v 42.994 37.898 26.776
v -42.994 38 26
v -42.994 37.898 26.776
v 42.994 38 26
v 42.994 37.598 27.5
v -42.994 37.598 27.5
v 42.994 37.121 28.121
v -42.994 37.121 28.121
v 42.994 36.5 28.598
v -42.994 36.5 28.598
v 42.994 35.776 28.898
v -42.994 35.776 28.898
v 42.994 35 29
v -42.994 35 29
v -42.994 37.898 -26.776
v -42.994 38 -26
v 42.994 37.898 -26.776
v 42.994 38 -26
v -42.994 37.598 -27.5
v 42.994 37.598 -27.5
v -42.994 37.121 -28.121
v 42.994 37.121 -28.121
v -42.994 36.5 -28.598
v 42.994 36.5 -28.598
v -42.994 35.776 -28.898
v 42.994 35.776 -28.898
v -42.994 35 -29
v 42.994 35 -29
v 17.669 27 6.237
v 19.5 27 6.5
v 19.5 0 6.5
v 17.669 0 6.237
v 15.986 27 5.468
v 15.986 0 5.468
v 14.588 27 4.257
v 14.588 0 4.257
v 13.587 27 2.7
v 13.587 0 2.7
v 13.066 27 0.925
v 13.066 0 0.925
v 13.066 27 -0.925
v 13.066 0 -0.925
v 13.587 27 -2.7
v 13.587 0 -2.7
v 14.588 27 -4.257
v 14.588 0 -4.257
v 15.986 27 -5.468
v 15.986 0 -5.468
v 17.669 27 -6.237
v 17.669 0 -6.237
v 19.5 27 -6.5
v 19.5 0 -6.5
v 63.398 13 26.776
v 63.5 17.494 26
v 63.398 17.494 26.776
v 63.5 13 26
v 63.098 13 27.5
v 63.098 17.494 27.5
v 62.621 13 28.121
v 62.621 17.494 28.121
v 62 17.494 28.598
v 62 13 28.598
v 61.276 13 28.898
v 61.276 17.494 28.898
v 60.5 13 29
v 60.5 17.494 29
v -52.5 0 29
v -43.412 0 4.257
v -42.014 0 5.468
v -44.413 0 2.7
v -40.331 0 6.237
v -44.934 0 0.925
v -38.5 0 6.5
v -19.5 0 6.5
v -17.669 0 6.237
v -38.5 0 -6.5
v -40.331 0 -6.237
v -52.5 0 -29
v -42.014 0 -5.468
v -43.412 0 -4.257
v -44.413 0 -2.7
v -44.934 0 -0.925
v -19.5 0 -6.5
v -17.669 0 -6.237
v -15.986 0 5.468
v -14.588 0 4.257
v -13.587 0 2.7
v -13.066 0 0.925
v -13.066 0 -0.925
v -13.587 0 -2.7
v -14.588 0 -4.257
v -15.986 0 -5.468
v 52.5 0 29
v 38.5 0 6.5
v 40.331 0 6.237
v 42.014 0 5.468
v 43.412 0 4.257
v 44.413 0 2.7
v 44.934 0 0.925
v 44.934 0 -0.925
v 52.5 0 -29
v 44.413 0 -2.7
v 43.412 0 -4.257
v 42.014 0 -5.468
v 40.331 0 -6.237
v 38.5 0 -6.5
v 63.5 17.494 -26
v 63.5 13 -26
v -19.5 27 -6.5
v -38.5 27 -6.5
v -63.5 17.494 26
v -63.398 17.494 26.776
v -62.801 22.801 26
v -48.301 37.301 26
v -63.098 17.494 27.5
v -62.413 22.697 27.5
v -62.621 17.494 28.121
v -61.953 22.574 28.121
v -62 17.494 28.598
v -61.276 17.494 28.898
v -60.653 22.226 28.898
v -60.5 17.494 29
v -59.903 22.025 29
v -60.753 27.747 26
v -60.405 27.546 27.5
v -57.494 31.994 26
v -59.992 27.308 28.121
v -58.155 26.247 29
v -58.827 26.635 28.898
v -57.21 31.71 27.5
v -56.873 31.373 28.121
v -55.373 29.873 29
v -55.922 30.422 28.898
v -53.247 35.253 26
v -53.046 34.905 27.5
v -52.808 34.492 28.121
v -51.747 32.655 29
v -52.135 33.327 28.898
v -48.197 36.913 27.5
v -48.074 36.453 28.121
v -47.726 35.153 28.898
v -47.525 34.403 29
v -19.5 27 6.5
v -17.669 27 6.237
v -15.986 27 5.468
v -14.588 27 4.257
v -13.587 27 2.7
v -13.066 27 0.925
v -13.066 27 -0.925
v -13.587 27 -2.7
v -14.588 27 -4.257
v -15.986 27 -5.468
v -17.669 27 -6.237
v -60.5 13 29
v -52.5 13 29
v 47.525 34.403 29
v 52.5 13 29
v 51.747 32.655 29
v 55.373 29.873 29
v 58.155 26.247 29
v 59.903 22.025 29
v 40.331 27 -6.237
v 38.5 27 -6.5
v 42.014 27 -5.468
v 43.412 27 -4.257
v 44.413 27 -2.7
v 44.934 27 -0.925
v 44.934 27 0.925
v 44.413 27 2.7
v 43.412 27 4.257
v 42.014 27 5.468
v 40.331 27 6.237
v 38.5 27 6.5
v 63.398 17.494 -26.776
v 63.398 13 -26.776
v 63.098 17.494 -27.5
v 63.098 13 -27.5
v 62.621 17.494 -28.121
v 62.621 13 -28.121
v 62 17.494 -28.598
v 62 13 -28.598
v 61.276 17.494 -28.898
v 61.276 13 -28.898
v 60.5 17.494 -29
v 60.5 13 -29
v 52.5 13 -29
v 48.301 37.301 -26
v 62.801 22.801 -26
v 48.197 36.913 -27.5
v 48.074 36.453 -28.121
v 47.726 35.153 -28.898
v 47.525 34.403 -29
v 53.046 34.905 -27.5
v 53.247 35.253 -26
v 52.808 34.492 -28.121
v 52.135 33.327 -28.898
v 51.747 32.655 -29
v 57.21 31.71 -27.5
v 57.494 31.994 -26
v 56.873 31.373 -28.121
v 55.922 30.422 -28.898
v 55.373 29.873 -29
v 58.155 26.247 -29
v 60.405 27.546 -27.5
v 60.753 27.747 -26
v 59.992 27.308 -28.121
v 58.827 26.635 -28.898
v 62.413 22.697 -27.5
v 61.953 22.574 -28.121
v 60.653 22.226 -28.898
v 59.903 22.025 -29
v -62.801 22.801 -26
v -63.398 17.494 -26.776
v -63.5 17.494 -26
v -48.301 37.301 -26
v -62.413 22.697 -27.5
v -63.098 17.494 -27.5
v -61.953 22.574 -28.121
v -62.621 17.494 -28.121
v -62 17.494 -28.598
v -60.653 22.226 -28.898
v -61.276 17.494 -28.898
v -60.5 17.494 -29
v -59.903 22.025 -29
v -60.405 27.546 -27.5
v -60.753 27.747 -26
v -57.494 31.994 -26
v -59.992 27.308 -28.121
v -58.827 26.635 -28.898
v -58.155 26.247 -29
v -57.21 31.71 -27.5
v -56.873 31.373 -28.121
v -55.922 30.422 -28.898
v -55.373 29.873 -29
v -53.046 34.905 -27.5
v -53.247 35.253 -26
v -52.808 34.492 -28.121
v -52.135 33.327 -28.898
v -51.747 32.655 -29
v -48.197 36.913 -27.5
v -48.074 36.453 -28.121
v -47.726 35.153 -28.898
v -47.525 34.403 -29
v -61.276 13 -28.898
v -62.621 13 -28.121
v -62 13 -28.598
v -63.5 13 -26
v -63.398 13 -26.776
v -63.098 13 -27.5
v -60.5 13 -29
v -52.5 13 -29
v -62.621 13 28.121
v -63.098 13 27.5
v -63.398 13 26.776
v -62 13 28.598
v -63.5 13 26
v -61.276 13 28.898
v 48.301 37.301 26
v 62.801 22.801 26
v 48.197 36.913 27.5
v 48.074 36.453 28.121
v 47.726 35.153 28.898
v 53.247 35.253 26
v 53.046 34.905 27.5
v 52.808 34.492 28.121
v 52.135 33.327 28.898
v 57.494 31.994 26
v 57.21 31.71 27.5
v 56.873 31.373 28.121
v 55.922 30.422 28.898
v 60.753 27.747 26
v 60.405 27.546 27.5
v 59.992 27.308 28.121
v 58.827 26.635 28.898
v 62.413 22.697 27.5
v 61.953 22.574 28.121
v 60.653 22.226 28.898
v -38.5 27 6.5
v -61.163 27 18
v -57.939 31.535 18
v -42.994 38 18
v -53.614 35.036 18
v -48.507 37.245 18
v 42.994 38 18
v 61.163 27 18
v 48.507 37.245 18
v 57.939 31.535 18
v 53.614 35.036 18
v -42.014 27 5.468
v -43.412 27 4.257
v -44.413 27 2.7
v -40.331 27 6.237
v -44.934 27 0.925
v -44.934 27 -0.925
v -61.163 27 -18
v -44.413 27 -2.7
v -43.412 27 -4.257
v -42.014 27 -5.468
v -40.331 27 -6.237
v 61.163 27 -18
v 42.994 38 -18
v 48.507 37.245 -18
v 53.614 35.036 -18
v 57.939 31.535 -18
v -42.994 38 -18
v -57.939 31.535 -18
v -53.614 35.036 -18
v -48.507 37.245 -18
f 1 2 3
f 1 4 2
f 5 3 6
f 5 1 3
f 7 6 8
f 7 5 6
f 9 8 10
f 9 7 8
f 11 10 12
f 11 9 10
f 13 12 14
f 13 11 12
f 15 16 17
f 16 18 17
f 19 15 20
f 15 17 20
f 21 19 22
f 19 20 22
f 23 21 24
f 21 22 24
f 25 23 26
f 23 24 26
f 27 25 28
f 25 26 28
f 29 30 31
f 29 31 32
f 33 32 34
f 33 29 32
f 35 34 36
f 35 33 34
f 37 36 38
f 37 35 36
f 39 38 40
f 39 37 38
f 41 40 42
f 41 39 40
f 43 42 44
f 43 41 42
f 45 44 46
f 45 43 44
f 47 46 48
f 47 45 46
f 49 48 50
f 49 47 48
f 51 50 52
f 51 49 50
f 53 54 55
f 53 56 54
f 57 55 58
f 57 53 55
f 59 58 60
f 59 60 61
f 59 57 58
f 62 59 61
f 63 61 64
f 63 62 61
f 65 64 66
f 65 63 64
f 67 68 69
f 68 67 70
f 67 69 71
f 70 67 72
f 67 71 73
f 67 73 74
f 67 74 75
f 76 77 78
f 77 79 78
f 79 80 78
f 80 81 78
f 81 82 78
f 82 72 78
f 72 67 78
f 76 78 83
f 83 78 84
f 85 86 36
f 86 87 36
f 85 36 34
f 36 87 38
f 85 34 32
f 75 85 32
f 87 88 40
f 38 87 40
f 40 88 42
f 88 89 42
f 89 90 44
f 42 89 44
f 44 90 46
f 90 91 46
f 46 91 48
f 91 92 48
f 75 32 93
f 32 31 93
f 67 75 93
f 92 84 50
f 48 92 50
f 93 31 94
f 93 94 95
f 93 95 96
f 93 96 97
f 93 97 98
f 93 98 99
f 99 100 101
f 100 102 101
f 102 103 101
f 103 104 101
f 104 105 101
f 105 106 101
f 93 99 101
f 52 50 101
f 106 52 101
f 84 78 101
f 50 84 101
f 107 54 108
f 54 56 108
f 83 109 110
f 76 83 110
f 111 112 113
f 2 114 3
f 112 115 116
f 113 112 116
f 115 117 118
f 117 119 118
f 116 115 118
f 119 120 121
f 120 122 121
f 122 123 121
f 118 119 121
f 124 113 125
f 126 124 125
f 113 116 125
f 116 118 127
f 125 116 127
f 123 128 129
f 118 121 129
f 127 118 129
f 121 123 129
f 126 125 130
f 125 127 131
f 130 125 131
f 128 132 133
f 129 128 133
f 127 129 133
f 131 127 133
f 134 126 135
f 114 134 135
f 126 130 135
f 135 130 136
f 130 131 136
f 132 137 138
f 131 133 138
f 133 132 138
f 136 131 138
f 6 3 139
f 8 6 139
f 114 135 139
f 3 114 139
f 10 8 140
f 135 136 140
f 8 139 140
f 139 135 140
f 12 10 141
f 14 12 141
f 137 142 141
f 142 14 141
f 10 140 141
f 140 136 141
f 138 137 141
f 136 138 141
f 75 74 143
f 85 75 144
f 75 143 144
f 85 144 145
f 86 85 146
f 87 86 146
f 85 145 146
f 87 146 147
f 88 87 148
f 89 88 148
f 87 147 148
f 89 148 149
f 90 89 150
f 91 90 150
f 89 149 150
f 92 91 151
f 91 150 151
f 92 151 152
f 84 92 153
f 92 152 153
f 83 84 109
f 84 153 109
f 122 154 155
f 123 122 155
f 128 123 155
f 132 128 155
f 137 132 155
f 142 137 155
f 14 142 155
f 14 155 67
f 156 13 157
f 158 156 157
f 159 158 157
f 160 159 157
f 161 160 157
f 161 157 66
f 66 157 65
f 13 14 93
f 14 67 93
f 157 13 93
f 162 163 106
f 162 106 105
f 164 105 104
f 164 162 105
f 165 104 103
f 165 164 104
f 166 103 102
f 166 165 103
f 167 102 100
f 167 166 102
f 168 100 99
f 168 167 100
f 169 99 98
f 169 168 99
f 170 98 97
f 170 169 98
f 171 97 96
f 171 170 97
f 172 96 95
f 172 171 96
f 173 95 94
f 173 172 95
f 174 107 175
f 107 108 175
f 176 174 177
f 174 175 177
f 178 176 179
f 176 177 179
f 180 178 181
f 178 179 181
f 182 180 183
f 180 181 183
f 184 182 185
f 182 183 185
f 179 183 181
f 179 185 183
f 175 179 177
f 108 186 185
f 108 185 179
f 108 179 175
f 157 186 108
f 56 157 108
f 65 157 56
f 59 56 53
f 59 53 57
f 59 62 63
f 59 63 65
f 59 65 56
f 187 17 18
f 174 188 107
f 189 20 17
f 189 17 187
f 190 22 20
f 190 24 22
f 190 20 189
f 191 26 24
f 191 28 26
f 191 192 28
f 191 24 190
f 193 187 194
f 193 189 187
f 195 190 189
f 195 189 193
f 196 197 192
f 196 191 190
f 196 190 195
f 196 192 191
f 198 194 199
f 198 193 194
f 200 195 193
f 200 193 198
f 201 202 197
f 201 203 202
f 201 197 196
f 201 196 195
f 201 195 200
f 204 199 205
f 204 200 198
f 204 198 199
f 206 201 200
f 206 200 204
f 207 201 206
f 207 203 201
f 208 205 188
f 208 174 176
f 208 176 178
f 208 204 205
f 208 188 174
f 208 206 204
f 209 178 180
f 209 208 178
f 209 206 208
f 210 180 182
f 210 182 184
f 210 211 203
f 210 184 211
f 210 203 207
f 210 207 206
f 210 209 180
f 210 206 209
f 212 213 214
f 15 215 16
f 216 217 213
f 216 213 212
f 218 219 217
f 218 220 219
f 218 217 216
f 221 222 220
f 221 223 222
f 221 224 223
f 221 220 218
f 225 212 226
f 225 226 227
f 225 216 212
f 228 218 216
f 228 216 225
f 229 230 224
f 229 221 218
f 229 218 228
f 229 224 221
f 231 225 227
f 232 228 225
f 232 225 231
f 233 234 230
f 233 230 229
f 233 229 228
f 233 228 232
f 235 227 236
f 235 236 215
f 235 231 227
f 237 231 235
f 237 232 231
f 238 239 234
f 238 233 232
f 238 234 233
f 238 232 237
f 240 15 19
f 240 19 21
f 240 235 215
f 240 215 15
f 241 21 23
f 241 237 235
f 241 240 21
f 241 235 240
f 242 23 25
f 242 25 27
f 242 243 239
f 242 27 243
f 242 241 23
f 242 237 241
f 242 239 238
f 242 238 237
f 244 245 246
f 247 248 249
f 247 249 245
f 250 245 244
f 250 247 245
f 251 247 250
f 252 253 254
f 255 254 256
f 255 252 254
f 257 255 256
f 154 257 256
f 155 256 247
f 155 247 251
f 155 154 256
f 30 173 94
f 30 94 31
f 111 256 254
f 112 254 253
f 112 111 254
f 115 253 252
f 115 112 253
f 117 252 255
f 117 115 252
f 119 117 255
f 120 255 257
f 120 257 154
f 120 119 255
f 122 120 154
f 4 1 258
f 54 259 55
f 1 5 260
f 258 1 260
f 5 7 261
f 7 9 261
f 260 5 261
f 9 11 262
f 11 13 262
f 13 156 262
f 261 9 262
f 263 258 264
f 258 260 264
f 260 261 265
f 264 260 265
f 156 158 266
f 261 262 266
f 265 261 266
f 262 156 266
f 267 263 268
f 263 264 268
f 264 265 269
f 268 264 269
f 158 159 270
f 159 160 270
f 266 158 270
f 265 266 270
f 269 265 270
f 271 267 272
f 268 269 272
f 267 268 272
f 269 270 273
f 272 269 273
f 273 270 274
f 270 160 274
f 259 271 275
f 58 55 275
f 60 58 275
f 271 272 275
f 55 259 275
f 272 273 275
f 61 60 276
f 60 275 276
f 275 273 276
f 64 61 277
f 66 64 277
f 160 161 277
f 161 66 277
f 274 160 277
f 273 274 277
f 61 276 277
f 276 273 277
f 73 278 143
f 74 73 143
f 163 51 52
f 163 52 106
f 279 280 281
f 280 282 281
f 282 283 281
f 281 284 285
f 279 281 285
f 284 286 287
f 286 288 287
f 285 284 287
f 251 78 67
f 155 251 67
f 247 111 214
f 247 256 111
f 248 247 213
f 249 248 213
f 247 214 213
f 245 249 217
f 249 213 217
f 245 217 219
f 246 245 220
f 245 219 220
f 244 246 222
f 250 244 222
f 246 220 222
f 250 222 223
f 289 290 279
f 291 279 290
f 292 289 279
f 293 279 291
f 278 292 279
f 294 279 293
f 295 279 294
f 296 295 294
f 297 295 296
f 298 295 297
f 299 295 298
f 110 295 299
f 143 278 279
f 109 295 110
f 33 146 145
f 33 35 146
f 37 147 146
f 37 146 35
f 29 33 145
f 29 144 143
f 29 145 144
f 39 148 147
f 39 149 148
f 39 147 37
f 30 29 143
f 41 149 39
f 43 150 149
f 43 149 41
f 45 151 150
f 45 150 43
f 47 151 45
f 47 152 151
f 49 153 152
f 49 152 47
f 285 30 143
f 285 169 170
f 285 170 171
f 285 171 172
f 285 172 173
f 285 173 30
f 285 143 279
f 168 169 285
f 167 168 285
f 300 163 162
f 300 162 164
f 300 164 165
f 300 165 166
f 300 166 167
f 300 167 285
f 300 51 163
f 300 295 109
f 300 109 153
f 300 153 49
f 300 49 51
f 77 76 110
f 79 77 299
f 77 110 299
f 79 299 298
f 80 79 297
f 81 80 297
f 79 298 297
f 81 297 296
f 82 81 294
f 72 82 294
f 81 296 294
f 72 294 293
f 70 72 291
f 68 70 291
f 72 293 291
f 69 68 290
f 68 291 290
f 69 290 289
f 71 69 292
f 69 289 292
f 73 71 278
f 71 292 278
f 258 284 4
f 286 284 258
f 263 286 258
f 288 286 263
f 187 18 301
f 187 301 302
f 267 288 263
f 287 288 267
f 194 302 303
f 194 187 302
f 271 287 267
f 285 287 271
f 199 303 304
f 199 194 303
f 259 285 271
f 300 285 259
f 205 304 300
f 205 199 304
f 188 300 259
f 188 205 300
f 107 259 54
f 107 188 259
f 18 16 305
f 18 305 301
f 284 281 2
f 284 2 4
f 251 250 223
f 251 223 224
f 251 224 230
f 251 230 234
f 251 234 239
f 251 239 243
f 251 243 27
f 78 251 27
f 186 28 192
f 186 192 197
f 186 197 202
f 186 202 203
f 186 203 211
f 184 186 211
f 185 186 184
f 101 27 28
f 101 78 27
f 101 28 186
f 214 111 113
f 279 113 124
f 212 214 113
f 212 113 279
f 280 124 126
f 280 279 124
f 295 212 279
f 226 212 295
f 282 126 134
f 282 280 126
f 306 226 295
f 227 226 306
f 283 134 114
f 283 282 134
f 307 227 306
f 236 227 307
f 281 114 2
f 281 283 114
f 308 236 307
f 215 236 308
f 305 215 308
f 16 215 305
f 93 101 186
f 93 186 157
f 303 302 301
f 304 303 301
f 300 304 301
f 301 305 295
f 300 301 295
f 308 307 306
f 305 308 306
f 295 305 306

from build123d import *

# Parameters (mm, degrees)
ESQUISSE1_W                 = 127
ESQUISSE1_H                 = 58
CREATION_PREMIER_CUBE_DEPTH = 38
ESQUISSE2_W                 = 11
ESQUISSE2_H                 = 58
ENLEVE_RECLANGLE_BAS_DEPTH  = 13
CONG_15_START               = -30
CONG_15_DEPTH               = 60
CONG_16_START               = -30
CONG_16_DEPTH               = 60
ENL_V_MAT_EXTRU_7_DEPTH     = 11
ENL_V_MAT_EXTRU_10_DEPTH    = 50
ENL_V_MAT_EXTRU_11_DEPTH    = 50
CONG_18_R                   = 3


with BuildPart() as part:
    # Esquisse1 → Creation premier cube (new body)
    with BuildSketch(Plane(origin=(0, 0, 0), x_dir=(1, 0, 0), z_dir=(0, 1, 0))):
        Rectangle(ESQUISSE1_W, ESQUISSE1_H)
    extrude(amount=CREATION_PREMIER_CUBE_DEPTH)

    # Esquisse2 → Enleve reclangle bas (cut)
    with BuildSketch(Plane.XZ):
        with Locations((58, 0)):
            Rectangle(ESQUISSE2_W, ESQUISSE2_H)
        with Locations((-58, 0)):
            Rectangle(ESQUISSE2_W, ESQUISSE2_H)
    extrude(amount=-ENLEVE_RECLANGLE_BAS_DEPTH, mode=Mode.SUBTRACT)

    # Congé15: read off the stored shape, not the designer's step
    # Congé15 outline → Congé15 (cut)
    with BuildSketch(Plane.XY.offset(CONG_15_START)):
        with BuildLine():
            Line((-63.5, 38), (-63.5, 17.493903346))
            ThreePointArc((-63.5, 17.493903346), (-57.493903346, 31.993903346), (-42.993903346, 38))
            Line((-42.993903346, 38), (-63.5, 38))
        make_face()
    extrude(amount=CONG_15_DEPTH, mode=Mode.SUBTRACT)

    # Congé16: read off the stored shape, not the designer's step
    # Congé16 outline → Congé16 (cut)
    with BuildSketch(Plane.XY.offset(CONG_16_START)):
        with BuildLine():
            ThreePointArc((42.993903346, 38), (57.493903346, 31.993903346), (63.5, 17.493903346))
            Line((63.5, 17.493903346), (63.5, 38))
            Line((63.5, 38), (42.993903346, 38))
        make_face()
    extrude(amount=CONG_16_DEPTH, mode=Mode.SUBTRACT)

    # Esquisse9 → Enlèv. mat.-Extru.7 (cut)
    with BuildSketch(Plane(origin=(0, 38, 0), x_dir=(1, 0, 0), z_dir=(0, 1, 0))):
        Polygon((-0.380283646, 18), (-63.5, 18), (-63.5, -18), (-0.380283646, -18), (63.5, -18), (63.5, 18), align=None)
    extrude(amount=-ENL_V_MAT_EXTRU_7_DEPTH, mode=Mode.SUBTRACT)

    # Esquisse10 → Enlèv. mat.-Extru.10 (cut)
    with BuildSketch(Plane(origin=(0, 27, 0), x_dir=(1, 0, 0), z_dir=(0, 1, 0))):
        with BuildLine():
            Line((-38.5, -6.5), (-19.5, -6.5))
            ThreePointArc((-19.5, -6.5), (-13, 0), (-19.5, 6.5))
            Line((-19.5, 6.5), (-38.5, 6.5))
            ThreePointArc((-38.5, 6.5), (-45, 0), (-38.5, -6.5))
        make_face()
    extrude(amount=-ENL_V_MAT_EXTRU_10_DEPTH, mode=Mode.SUBTRACT)

    # Esquisse10<3> → Enlèv. mat.-Extru.11 (cut)
    with BuildSketch(Plane(origin=(0, 27, 0), x_dir=(1, 0, 0), z_dir=(0, 1, 0))):
        with BuildLine():
            Line((38.5, -6.5), (19.5, -6.5))
            ThreePointArc((19.5, -6.5), (13, 0), (19.5, 6.5))
            Line((19.5, 6.5), (38.5, 6.5))
            ThreePointArc((38.5, 6.5), (45, 0), (38.5, -6.5))
        make_face()
        with BuildLine():
            Line((-38.5, -6.5), (-19.5, -6.5))
            ThreePointArc((-19.5, -6.5), (-13, 0), (-19.5, 6.5))
            Line((-19.5, 6.5), (-38.5, 6.5))
            ThreePointArc((-38.5, 6.5), (-45, 0), (-38.5, -6.5))
        make_face()
    extrude(amount=-ENL_V_MAT_EXTRU_11_DEPTH, mode=Mode.SUBTRACT)

    # Congé18
    cong_18_edges = [part.edges().sort_by_distance(p)[0] for p in [
        (-63.5, 15.246951673, -29),
        (-63.5, 15.246951673, 29),
        (0, 38, 29),
        (-57.493903346, 31.993903346, 29),
        (-57.493903346, 31.993903346, -29),
        (63.5, 15.246951673, -29),
        (63.5, 15.246951673, 29),
        (0, 38, -29),
        (57.493903346, 31.993903346, -29),
        (57.493903346, 31.993903346, 29),
    ]]
    fillet(cong_18_edges, radius=CONG_18_R)


solid = part.part
